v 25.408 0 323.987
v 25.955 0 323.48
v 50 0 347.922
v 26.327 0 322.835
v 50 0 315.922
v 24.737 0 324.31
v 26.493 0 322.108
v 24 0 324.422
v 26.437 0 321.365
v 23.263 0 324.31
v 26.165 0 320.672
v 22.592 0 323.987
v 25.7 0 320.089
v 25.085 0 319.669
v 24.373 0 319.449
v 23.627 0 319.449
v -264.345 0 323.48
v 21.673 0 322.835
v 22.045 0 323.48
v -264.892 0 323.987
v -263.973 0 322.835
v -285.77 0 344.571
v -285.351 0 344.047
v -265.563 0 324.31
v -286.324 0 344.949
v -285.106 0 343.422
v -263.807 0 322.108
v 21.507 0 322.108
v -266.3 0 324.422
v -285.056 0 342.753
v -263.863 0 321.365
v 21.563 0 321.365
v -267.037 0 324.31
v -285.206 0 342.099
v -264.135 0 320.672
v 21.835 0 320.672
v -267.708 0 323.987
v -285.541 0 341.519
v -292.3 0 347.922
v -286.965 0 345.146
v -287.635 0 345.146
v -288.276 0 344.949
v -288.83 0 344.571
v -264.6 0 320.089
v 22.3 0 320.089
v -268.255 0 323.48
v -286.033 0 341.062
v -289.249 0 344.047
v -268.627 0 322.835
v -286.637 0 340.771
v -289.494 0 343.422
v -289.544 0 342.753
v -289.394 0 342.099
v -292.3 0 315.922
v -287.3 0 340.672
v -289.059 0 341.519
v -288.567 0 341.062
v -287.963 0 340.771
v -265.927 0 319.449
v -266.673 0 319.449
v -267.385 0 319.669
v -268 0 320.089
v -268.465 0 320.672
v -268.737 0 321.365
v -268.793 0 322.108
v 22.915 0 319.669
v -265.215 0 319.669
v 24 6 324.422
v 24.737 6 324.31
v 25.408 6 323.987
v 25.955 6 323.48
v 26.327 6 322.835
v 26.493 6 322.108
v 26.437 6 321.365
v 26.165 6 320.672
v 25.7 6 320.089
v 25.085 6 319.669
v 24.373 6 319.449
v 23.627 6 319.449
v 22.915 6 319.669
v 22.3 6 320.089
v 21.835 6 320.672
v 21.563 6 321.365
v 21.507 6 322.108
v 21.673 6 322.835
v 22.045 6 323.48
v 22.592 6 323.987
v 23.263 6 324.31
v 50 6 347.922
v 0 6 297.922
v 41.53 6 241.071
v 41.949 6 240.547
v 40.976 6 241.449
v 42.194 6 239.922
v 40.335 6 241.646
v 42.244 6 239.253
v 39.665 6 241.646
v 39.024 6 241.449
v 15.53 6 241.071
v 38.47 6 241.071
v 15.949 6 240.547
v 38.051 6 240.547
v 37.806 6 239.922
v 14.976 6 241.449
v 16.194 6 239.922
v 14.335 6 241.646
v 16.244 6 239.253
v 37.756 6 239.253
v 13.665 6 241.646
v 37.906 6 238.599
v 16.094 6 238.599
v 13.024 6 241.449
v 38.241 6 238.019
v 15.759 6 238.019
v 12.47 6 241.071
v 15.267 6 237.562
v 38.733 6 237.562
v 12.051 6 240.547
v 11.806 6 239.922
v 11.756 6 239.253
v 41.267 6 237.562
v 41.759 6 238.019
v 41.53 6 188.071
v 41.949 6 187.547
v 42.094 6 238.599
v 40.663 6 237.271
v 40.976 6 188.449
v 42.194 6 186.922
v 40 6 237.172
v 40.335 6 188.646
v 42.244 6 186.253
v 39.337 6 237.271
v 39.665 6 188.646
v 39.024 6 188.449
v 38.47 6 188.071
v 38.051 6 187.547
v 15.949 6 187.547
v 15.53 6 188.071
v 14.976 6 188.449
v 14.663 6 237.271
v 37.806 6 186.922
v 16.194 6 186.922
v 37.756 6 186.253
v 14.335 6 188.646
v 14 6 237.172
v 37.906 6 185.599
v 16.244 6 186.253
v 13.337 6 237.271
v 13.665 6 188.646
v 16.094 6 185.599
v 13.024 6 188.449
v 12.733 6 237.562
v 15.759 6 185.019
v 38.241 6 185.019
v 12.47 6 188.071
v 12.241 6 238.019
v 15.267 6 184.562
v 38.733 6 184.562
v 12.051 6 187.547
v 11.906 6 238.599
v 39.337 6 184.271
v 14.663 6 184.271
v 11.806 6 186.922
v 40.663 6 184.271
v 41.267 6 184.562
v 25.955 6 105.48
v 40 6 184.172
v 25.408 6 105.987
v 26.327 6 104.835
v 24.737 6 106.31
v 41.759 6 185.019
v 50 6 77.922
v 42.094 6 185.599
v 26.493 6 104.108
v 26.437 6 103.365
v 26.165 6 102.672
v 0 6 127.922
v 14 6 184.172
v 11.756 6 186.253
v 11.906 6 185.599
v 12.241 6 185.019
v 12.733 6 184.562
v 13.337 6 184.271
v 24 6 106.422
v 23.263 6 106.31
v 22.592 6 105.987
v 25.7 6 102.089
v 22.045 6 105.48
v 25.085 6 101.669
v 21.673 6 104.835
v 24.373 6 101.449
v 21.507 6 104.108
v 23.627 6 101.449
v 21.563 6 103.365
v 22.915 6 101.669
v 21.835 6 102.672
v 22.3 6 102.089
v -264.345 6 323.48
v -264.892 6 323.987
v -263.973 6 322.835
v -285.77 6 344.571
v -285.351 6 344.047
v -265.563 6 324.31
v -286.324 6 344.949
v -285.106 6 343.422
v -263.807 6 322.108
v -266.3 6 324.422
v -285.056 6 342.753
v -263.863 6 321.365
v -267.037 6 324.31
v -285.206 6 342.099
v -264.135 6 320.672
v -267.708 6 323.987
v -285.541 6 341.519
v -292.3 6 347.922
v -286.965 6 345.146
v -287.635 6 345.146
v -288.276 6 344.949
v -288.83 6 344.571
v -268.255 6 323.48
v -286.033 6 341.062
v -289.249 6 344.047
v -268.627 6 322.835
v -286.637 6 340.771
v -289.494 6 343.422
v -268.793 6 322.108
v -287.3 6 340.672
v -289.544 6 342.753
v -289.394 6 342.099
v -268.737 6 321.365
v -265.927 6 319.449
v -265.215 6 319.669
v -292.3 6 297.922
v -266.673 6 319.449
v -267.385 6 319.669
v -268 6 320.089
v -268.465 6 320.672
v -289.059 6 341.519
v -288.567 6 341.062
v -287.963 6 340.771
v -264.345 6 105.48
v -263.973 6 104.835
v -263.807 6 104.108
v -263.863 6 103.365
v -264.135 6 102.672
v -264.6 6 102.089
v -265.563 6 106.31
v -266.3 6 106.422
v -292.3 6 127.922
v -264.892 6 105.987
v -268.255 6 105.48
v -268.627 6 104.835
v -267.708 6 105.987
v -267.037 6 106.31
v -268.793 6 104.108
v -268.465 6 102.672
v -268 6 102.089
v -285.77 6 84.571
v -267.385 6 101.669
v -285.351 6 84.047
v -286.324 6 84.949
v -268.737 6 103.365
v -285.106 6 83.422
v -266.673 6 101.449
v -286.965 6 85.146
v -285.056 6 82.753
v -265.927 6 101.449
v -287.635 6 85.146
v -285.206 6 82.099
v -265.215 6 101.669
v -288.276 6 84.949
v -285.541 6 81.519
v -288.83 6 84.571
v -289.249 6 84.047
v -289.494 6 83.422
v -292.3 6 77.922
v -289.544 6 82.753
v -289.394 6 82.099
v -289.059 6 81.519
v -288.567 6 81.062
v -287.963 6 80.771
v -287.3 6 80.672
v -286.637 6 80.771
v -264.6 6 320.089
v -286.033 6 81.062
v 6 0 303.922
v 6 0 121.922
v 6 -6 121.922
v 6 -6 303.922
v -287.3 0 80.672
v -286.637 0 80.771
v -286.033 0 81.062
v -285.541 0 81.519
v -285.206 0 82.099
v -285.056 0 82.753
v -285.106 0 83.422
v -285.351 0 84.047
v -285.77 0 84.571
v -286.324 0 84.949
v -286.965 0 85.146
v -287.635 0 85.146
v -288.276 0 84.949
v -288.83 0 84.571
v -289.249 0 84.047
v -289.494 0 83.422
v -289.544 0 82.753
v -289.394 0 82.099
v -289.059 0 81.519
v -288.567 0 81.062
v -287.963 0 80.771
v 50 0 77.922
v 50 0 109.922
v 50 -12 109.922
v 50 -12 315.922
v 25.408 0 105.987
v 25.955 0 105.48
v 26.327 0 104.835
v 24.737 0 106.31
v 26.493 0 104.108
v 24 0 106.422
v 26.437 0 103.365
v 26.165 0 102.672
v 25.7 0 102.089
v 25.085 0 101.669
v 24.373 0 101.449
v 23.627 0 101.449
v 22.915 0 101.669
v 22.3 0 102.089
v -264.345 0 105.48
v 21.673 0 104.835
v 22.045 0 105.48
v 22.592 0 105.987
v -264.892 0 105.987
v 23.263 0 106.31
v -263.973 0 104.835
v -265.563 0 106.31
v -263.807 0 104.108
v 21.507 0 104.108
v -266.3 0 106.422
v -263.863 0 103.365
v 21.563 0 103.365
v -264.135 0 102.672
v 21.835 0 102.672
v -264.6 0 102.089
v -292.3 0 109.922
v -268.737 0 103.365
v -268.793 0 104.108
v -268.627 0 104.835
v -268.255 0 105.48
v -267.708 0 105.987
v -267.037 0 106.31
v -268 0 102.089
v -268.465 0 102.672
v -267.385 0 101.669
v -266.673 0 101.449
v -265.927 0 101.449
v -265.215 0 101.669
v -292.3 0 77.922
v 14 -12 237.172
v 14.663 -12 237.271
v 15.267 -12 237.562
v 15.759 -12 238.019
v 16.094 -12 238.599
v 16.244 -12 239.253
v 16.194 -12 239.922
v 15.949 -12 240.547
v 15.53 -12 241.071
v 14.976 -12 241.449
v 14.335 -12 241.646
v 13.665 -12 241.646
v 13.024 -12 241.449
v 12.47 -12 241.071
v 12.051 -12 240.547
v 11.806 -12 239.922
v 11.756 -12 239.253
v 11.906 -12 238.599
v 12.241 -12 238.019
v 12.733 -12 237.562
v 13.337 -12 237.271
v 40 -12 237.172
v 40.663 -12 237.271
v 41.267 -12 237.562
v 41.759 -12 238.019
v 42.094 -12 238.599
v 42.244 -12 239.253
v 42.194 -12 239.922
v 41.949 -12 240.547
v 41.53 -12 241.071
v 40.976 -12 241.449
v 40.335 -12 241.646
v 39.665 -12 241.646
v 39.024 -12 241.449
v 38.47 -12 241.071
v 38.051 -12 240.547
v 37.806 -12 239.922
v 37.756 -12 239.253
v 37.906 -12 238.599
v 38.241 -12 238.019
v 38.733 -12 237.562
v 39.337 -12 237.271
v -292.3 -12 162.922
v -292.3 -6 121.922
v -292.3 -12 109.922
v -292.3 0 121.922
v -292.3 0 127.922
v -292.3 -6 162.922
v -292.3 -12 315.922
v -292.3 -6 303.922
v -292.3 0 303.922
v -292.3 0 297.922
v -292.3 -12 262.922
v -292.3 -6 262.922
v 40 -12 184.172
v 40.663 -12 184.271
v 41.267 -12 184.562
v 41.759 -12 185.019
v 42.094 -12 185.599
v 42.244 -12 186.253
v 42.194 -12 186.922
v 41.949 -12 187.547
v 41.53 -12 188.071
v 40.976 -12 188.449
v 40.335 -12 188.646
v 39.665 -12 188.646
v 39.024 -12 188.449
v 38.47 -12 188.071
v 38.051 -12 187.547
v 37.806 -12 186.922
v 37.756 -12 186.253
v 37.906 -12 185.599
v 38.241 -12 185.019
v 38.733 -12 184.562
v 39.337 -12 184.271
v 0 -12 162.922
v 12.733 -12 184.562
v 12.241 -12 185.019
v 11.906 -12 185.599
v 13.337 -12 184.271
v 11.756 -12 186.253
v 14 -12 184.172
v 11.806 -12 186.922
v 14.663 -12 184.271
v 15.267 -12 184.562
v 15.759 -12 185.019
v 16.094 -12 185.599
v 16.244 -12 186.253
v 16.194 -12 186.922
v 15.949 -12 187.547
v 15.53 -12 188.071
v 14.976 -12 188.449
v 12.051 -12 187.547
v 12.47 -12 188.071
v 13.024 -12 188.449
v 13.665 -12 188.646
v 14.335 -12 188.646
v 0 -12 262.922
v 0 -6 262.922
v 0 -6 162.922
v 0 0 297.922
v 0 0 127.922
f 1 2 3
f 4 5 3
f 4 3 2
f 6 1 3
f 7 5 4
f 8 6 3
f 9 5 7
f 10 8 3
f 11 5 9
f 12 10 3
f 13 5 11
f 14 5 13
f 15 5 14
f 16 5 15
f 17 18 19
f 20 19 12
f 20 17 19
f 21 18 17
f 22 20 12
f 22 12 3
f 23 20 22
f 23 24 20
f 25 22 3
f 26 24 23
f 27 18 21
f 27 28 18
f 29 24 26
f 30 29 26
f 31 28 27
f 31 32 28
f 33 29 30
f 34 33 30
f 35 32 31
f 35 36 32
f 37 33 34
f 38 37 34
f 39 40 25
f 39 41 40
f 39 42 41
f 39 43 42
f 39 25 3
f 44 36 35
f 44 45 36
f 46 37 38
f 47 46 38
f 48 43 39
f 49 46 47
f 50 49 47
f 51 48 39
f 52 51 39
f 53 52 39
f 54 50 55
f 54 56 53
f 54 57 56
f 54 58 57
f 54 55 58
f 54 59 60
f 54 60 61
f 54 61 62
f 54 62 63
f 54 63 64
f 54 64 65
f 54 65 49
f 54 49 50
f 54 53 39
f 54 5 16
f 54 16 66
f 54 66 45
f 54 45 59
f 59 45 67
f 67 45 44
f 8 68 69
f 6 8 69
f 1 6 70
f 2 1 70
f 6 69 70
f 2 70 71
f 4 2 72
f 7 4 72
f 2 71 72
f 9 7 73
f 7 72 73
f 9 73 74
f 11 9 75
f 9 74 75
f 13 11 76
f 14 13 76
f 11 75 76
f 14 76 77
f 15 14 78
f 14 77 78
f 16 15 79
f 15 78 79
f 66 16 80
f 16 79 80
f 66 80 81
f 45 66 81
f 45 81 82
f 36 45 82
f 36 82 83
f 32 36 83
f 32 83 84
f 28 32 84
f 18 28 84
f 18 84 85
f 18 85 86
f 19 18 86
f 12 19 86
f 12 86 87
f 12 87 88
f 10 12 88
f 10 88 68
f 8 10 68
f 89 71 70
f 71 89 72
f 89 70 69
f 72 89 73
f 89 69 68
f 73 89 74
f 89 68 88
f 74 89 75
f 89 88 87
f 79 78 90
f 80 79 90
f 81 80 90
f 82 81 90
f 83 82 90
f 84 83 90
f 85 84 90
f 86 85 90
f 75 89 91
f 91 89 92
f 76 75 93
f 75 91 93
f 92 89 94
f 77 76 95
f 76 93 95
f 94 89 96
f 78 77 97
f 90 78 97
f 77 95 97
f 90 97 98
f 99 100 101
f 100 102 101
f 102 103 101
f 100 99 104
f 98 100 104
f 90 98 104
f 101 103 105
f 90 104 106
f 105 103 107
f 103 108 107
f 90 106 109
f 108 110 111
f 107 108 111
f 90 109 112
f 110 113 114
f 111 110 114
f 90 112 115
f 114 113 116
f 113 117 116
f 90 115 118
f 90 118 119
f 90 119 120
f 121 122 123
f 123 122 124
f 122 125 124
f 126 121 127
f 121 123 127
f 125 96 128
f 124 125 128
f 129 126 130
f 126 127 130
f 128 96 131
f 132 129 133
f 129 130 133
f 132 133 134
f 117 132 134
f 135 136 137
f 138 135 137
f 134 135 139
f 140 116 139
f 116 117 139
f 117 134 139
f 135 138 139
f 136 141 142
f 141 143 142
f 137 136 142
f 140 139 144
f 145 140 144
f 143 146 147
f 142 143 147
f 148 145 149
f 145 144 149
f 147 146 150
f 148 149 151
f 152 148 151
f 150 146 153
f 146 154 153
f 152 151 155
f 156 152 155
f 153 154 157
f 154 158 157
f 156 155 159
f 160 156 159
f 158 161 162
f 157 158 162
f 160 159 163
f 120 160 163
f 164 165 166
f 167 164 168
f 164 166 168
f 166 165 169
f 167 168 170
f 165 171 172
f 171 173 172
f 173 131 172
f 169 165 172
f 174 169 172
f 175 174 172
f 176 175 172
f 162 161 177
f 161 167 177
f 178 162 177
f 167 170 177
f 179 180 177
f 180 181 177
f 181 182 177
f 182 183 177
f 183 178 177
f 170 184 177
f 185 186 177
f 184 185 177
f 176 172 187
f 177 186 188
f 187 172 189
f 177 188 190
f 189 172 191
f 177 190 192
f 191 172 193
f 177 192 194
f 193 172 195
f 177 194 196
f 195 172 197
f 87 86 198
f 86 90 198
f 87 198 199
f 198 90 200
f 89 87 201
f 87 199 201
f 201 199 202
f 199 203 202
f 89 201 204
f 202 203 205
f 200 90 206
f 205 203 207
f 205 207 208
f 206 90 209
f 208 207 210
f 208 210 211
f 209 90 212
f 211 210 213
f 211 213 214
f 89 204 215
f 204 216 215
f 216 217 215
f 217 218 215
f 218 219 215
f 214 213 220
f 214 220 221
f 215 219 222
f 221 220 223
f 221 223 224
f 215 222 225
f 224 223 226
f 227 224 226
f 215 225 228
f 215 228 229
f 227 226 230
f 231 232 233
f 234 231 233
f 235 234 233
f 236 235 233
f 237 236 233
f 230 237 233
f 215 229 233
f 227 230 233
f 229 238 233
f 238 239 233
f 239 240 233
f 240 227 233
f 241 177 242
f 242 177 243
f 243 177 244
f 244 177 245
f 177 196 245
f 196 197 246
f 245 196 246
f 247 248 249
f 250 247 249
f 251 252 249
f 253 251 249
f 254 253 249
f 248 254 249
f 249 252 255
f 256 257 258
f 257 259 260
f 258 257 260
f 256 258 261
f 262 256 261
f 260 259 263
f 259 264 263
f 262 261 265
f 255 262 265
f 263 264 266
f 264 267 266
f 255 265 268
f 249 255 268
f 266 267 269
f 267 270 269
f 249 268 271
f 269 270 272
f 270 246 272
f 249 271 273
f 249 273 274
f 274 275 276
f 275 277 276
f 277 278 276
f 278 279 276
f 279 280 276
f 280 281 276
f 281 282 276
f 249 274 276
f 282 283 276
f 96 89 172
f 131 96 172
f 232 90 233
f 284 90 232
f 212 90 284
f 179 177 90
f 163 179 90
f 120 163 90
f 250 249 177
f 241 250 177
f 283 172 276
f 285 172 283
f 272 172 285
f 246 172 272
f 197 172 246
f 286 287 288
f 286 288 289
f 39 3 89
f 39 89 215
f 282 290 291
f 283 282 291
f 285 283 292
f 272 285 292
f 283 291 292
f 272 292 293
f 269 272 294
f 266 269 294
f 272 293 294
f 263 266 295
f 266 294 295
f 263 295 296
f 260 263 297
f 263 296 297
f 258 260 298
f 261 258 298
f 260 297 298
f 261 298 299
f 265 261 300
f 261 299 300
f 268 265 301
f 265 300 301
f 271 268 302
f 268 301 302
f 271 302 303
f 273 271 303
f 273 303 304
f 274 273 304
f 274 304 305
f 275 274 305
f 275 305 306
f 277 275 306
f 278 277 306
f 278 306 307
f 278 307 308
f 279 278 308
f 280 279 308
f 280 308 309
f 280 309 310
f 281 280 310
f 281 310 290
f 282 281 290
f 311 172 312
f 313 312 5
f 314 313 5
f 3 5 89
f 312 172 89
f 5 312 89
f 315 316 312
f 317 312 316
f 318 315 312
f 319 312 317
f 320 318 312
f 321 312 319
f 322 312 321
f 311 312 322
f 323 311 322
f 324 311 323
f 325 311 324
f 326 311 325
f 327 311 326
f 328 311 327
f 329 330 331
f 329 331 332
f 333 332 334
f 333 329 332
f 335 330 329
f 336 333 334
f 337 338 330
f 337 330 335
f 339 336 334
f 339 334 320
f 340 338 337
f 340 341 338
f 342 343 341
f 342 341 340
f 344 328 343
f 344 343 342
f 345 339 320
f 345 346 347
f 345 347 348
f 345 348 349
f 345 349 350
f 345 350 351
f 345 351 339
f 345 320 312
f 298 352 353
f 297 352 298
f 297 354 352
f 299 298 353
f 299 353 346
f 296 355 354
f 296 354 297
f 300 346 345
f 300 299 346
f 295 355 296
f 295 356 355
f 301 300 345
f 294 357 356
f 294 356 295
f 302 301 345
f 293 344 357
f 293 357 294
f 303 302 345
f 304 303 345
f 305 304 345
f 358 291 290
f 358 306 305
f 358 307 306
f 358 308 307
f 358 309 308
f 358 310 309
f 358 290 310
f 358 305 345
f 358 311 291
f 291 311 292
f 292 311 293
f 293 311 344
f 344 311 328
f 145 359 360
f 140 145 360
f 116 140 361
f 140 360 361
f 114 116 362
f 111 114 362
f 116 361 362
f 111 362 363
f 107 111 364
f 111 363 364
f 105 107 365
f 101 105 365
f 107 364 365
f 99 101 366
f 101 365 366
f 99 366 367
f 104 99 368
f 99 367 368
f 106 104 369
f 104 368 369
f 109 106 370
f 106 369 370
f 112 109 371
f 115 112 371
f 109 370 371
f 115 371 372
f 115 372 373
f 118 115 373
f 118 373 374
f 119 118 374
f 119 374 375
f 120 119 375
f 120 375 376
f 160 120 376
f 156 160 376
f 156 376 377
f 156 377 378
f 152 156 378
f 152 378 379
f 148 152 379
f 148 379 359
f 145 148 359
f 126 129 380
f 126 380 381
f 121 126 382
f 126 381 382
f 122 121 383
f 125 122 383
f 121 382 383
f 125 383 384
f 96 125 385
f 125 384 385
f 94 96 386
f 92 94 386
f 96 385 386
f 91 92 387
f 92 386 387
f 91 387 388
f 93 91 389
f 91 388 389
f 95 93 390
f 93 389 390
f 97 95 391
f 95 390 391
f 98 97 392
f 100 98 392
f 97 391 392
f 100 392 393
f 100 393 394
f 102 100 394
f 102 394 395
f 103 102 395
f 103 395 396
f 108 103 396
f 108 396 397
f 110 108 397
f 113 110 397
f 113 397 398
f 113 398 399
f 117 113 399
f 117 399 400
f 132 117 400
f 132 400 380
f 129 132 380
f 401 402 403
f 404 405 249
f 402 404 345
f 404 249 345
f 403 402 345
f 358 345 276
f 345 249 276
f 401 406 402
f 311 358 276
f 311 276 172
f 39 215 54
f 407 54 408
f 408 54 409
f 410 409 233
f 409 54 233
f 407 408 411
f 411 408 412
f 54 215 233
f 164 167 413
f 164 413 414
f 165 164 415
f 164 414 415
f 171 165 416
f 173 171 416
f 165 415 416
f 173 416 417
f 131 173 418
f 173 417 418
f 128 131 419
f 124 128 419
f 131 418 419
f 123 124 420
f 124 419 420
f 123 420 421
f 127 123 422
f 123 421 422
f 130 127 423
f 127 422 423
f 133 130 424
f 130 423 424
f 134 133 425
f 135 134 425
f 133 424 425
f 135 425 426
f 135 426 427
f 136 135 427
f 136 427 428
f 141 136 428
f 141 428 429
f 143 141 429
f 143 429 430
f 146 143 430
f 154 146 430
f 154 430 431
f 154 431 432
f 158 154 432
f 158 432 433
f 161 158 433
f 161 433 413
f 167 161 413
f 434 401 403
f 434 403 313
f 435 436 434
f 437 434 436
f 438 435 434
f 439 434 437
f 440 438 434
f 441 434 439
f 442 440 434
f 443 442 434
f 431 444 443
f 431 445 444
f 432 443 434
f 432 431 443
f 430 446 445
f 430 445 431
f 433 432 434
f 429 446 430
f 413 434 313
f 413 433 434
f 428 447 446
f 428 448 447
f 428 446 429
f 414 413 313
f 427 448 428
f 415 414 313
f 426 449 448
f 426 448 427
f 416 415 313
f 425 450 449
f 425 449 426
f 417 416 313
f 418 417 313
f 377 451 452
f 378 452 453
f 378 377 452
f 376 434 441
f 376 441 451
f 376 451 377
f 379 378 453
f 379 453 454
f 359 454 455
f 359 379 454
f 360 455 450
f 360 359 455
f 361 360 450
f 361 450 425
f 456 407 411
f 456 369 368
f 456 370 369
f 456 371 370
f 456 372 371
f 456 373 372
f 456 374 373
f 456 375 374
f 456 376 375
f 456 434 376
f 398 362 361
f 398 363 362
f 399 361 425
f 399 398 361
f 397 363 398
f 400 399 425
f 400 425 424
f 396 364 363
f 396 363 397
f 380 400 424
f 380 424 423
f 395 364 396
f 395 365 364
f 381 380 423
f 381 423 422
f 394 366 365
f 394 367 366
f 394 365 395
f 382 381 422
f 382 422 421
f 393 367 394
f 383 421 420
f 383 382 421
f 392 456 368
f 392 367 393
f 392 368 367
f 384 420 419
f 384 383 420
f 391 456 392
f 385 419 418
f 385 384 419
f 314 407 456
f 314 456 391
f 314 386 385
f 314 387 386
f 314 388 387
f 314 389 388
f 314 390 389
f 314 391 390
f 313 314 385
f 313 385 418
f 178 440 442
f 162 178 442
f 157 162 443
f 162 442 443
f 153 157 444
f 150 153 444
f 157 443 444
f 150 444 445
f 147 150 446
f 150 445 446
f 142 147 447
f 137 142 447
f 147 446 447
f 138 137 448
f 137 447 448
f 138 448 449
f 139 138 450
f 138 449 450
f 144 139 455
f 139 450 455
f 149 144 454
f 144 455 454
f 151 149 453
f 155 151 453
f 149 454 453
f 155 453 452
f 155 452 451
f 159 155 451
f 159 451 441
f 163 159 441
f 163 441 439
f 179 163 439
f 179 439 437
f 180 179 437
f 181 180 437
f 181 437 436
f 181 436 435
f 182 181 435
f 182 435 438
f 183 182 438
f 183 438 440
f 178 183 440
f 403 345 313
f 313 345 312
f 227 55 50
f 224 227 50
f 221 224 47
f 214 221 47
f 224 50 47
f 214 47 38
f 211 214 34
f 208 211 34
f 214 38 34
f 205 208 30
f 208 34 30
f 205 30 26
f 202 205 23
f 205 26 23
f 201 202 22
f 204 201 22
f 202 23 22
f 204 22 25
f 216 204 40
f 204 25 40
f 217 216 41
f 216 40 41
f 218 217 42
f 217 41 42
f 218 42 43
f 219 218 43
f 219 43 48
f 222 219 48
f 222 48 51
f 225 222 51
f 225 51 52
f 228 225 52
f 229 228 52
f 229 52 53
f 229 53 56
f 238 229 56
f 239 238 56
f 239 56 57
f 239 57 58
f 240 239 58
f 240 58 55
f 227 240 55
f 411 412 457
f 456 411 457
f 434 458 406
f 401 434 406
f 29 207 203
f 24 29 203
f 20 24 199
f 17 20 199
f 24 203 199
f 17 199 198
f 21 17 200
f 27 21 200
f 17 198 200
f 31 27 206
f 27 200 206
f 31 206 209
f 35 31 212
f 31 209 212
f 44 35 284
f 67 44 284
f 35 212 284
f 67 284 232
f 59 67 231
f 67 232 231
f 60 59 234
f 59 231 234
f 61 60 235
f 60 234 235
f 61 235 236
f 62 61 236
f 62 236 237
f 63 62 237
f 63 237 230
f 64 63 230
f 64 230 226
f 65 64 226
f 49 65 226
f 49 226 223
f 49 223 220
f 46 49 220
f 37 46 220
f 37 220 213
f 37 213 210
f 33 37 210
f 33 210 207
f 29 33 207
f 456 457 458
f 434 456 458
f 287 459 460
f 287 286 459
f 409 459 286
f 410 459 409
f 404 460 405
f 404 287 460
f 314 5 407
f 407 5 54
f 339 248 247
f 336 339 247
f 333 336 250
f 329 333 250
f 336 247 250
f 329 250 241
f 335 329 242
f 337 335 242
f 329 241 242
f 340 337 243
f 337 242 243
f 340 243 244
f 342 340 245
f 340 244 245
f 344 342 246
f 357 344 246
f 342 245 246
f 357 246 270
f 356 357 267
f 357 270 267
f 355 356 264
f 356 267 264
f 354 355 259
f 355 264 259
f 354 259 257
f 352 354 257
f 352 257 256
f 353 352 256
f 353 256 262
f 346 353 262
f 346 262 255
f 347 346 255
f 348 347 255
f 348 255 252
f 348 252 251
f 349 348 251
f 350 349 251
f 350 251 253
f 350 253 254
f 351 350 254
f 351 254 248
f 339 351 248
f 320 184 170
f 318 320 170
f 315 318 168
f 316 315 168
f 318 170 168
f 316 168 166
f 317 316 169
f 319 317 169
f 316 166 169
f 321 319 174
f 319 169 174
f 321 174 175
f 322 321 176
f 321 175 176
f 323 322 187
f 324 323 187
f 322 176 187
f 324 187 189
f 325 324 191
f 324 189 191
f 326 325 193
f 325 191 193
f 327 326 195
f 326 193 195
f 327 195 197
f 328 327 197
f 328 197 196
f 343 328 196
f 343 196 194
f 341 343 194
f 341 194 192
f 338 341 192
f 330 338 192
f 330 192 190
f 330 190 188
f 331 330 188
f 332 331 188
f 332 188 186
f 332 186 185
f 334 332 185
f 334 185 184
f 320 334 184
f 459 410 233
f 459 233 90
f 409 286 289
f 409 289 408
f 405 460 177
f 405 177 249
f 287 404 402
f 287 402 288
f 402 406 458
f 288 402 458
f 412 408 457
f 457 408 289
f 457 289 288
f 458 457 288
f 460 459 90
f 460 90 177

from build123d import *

# Parameters (mm, degrees)
EXTRUDE_2_DEPTH             = 6
EXTRUDE_3_DEPTH             = 6
SKETCH_4_R                  = 2.5
CUT_EXTRUDE_1_DEPTH         = 455.56865906
PATTERN_LINEAR_2_COUNT      = 2
PATTERN_LINEAR_2_PITCH      = 290.3
PATTERN_LINEAR_2_COUNT_DIR2 = 2
PATTERN_LINEAR_2_PITCH_DIR2 = 218
EXTRUDE_4_DEPTH             = 6
SKETCH_6_R                  = 2.25
CUT_EXTRUDE_2_DEPTH         = 455.766605854
SKETCH_7_R                  = 2.25
CUT_EXTRUDE_3_DEPTH         = 455.56865906


with BuildPart() as part:
    # Эскиз1 → Бобышка-Вытянуть2 (new body)
    with BuildSketch(Plane(origin=(0, 0, 0), x_dir=(1, 0, 0), z_dir=(0, 1, 0))):
        Polygon((50, -77.921508101), (50, -347.921508101), (-292.3, -347.921508101), (-292.3, -297.921508101), (0, -297.921508101), (0, -127.921508101), (-292.3, -127.921508101), (-292.3, -77.921508101), align=None)
    extrude(amount=EXTRUDE_2_DEPTH)

    # Эскиз2 → Бобышка-Вытянуть3 (add)
    with BuildSketch(Plane.XZ):
        Polygon((50, 315.921508101), (50, 109.921508101), (-292.3, 109.921508101), (-292.3, 121.921508101), (6, 121.921508101), (6, 303.921508101), (-292.3, 303.921508101), (-292.3, 315.921508101), align=None)
    extrude(amount=EXTRUDE_3_DEPTH)

    # Эскиз4 → Вырез-Вытянуть1 (cut, through all)
    with BuildSketch(Plane(origin=(0, 6, 0), x_dir=(1, 0, 0), z_dir=(0, 1, 0))):
        with Locations(Location((-266.3, -103.921508101, 0), (0, 0, 270))):
            Circle(SKETCH_4_R)
    cut_extrude_1 = extrude(amount=-CUT_EXTRUDE_1_DEPTH, mode=Mode.SUBTRACT)

    # Линейный массив2: Cut-Extrude 1 2 × 2
    with Locations(*[(i * PATTERN_LINEAR_2_PITCH, 0, j * PATTERN_LINEAR_2_PITCH_DIR2) for i in range(PATTERN_LINEAR_2_COUNT) for j in range(PATTERN_LINEAR_2_COUNT_DIR2) if (i, j) != (0, 0)]):
        add(cut_extrude_1, mode=Mode.SUBTRACT)

    # Эскиз5 → Бобышка-Вытянуть4 (add)
    with BuildSketch(Plane.XZ.offset(6)):
        Polygon((50, 315.921508101), (-292.3, 315.921508101), (-292.3, 262.921508101), (0, 262.921508101), (0, 162.921508101), (-292.3, 162.921508101), (-292.3, 109.921508101), (50, 109.921508101), align=None)
    extrude(amount=EXTRUDE_4_DEPTH)

    # Эскиз6 → Вырез-Вытянуть2 (cut, through all)
    with BuildSketch(Plane.XZ.offset(12)):
        with Locations(Location((14, 239.421508101, 0), (0, 0, 270))):
            Circle(SKETCH_6_R)
        with Locations(Location((40, 239.421508101, 0), (0, 0, 270))):
            Circle(SKETCH_6_R)
        with Locations(Location((40, 186.421508101, 0), (0, 0, 270))):
            Circle(SKETCH_6_R)
        with Locations(Location((14, 186.421508101, 0), (0, 0, 270))):
            Circle(SKETCH_6_R)
    extrude(amount=-CUT_EXTRUDE_2_DEPTH, mode=Mode.SUBTRACT)

    # Эскиз7 → Вырез-Вытянуть3 (cut, through all)
    with BuildSketch(Plane.XZ):
        with Locations(Location((-287.3, 342.921508101, 0), (0, 0, 270))):
            Circle(SKETCH_7_R)
        with Locations(Location((-287.3, 82.921508101, 0), (0, 0, 270))):
            Circle(SKETCH_7_R)
    extrude(amount=-CUT_EXTRUDE_3_DEPTH, mode=Mode.SUBTRACT)


solid = part.part
